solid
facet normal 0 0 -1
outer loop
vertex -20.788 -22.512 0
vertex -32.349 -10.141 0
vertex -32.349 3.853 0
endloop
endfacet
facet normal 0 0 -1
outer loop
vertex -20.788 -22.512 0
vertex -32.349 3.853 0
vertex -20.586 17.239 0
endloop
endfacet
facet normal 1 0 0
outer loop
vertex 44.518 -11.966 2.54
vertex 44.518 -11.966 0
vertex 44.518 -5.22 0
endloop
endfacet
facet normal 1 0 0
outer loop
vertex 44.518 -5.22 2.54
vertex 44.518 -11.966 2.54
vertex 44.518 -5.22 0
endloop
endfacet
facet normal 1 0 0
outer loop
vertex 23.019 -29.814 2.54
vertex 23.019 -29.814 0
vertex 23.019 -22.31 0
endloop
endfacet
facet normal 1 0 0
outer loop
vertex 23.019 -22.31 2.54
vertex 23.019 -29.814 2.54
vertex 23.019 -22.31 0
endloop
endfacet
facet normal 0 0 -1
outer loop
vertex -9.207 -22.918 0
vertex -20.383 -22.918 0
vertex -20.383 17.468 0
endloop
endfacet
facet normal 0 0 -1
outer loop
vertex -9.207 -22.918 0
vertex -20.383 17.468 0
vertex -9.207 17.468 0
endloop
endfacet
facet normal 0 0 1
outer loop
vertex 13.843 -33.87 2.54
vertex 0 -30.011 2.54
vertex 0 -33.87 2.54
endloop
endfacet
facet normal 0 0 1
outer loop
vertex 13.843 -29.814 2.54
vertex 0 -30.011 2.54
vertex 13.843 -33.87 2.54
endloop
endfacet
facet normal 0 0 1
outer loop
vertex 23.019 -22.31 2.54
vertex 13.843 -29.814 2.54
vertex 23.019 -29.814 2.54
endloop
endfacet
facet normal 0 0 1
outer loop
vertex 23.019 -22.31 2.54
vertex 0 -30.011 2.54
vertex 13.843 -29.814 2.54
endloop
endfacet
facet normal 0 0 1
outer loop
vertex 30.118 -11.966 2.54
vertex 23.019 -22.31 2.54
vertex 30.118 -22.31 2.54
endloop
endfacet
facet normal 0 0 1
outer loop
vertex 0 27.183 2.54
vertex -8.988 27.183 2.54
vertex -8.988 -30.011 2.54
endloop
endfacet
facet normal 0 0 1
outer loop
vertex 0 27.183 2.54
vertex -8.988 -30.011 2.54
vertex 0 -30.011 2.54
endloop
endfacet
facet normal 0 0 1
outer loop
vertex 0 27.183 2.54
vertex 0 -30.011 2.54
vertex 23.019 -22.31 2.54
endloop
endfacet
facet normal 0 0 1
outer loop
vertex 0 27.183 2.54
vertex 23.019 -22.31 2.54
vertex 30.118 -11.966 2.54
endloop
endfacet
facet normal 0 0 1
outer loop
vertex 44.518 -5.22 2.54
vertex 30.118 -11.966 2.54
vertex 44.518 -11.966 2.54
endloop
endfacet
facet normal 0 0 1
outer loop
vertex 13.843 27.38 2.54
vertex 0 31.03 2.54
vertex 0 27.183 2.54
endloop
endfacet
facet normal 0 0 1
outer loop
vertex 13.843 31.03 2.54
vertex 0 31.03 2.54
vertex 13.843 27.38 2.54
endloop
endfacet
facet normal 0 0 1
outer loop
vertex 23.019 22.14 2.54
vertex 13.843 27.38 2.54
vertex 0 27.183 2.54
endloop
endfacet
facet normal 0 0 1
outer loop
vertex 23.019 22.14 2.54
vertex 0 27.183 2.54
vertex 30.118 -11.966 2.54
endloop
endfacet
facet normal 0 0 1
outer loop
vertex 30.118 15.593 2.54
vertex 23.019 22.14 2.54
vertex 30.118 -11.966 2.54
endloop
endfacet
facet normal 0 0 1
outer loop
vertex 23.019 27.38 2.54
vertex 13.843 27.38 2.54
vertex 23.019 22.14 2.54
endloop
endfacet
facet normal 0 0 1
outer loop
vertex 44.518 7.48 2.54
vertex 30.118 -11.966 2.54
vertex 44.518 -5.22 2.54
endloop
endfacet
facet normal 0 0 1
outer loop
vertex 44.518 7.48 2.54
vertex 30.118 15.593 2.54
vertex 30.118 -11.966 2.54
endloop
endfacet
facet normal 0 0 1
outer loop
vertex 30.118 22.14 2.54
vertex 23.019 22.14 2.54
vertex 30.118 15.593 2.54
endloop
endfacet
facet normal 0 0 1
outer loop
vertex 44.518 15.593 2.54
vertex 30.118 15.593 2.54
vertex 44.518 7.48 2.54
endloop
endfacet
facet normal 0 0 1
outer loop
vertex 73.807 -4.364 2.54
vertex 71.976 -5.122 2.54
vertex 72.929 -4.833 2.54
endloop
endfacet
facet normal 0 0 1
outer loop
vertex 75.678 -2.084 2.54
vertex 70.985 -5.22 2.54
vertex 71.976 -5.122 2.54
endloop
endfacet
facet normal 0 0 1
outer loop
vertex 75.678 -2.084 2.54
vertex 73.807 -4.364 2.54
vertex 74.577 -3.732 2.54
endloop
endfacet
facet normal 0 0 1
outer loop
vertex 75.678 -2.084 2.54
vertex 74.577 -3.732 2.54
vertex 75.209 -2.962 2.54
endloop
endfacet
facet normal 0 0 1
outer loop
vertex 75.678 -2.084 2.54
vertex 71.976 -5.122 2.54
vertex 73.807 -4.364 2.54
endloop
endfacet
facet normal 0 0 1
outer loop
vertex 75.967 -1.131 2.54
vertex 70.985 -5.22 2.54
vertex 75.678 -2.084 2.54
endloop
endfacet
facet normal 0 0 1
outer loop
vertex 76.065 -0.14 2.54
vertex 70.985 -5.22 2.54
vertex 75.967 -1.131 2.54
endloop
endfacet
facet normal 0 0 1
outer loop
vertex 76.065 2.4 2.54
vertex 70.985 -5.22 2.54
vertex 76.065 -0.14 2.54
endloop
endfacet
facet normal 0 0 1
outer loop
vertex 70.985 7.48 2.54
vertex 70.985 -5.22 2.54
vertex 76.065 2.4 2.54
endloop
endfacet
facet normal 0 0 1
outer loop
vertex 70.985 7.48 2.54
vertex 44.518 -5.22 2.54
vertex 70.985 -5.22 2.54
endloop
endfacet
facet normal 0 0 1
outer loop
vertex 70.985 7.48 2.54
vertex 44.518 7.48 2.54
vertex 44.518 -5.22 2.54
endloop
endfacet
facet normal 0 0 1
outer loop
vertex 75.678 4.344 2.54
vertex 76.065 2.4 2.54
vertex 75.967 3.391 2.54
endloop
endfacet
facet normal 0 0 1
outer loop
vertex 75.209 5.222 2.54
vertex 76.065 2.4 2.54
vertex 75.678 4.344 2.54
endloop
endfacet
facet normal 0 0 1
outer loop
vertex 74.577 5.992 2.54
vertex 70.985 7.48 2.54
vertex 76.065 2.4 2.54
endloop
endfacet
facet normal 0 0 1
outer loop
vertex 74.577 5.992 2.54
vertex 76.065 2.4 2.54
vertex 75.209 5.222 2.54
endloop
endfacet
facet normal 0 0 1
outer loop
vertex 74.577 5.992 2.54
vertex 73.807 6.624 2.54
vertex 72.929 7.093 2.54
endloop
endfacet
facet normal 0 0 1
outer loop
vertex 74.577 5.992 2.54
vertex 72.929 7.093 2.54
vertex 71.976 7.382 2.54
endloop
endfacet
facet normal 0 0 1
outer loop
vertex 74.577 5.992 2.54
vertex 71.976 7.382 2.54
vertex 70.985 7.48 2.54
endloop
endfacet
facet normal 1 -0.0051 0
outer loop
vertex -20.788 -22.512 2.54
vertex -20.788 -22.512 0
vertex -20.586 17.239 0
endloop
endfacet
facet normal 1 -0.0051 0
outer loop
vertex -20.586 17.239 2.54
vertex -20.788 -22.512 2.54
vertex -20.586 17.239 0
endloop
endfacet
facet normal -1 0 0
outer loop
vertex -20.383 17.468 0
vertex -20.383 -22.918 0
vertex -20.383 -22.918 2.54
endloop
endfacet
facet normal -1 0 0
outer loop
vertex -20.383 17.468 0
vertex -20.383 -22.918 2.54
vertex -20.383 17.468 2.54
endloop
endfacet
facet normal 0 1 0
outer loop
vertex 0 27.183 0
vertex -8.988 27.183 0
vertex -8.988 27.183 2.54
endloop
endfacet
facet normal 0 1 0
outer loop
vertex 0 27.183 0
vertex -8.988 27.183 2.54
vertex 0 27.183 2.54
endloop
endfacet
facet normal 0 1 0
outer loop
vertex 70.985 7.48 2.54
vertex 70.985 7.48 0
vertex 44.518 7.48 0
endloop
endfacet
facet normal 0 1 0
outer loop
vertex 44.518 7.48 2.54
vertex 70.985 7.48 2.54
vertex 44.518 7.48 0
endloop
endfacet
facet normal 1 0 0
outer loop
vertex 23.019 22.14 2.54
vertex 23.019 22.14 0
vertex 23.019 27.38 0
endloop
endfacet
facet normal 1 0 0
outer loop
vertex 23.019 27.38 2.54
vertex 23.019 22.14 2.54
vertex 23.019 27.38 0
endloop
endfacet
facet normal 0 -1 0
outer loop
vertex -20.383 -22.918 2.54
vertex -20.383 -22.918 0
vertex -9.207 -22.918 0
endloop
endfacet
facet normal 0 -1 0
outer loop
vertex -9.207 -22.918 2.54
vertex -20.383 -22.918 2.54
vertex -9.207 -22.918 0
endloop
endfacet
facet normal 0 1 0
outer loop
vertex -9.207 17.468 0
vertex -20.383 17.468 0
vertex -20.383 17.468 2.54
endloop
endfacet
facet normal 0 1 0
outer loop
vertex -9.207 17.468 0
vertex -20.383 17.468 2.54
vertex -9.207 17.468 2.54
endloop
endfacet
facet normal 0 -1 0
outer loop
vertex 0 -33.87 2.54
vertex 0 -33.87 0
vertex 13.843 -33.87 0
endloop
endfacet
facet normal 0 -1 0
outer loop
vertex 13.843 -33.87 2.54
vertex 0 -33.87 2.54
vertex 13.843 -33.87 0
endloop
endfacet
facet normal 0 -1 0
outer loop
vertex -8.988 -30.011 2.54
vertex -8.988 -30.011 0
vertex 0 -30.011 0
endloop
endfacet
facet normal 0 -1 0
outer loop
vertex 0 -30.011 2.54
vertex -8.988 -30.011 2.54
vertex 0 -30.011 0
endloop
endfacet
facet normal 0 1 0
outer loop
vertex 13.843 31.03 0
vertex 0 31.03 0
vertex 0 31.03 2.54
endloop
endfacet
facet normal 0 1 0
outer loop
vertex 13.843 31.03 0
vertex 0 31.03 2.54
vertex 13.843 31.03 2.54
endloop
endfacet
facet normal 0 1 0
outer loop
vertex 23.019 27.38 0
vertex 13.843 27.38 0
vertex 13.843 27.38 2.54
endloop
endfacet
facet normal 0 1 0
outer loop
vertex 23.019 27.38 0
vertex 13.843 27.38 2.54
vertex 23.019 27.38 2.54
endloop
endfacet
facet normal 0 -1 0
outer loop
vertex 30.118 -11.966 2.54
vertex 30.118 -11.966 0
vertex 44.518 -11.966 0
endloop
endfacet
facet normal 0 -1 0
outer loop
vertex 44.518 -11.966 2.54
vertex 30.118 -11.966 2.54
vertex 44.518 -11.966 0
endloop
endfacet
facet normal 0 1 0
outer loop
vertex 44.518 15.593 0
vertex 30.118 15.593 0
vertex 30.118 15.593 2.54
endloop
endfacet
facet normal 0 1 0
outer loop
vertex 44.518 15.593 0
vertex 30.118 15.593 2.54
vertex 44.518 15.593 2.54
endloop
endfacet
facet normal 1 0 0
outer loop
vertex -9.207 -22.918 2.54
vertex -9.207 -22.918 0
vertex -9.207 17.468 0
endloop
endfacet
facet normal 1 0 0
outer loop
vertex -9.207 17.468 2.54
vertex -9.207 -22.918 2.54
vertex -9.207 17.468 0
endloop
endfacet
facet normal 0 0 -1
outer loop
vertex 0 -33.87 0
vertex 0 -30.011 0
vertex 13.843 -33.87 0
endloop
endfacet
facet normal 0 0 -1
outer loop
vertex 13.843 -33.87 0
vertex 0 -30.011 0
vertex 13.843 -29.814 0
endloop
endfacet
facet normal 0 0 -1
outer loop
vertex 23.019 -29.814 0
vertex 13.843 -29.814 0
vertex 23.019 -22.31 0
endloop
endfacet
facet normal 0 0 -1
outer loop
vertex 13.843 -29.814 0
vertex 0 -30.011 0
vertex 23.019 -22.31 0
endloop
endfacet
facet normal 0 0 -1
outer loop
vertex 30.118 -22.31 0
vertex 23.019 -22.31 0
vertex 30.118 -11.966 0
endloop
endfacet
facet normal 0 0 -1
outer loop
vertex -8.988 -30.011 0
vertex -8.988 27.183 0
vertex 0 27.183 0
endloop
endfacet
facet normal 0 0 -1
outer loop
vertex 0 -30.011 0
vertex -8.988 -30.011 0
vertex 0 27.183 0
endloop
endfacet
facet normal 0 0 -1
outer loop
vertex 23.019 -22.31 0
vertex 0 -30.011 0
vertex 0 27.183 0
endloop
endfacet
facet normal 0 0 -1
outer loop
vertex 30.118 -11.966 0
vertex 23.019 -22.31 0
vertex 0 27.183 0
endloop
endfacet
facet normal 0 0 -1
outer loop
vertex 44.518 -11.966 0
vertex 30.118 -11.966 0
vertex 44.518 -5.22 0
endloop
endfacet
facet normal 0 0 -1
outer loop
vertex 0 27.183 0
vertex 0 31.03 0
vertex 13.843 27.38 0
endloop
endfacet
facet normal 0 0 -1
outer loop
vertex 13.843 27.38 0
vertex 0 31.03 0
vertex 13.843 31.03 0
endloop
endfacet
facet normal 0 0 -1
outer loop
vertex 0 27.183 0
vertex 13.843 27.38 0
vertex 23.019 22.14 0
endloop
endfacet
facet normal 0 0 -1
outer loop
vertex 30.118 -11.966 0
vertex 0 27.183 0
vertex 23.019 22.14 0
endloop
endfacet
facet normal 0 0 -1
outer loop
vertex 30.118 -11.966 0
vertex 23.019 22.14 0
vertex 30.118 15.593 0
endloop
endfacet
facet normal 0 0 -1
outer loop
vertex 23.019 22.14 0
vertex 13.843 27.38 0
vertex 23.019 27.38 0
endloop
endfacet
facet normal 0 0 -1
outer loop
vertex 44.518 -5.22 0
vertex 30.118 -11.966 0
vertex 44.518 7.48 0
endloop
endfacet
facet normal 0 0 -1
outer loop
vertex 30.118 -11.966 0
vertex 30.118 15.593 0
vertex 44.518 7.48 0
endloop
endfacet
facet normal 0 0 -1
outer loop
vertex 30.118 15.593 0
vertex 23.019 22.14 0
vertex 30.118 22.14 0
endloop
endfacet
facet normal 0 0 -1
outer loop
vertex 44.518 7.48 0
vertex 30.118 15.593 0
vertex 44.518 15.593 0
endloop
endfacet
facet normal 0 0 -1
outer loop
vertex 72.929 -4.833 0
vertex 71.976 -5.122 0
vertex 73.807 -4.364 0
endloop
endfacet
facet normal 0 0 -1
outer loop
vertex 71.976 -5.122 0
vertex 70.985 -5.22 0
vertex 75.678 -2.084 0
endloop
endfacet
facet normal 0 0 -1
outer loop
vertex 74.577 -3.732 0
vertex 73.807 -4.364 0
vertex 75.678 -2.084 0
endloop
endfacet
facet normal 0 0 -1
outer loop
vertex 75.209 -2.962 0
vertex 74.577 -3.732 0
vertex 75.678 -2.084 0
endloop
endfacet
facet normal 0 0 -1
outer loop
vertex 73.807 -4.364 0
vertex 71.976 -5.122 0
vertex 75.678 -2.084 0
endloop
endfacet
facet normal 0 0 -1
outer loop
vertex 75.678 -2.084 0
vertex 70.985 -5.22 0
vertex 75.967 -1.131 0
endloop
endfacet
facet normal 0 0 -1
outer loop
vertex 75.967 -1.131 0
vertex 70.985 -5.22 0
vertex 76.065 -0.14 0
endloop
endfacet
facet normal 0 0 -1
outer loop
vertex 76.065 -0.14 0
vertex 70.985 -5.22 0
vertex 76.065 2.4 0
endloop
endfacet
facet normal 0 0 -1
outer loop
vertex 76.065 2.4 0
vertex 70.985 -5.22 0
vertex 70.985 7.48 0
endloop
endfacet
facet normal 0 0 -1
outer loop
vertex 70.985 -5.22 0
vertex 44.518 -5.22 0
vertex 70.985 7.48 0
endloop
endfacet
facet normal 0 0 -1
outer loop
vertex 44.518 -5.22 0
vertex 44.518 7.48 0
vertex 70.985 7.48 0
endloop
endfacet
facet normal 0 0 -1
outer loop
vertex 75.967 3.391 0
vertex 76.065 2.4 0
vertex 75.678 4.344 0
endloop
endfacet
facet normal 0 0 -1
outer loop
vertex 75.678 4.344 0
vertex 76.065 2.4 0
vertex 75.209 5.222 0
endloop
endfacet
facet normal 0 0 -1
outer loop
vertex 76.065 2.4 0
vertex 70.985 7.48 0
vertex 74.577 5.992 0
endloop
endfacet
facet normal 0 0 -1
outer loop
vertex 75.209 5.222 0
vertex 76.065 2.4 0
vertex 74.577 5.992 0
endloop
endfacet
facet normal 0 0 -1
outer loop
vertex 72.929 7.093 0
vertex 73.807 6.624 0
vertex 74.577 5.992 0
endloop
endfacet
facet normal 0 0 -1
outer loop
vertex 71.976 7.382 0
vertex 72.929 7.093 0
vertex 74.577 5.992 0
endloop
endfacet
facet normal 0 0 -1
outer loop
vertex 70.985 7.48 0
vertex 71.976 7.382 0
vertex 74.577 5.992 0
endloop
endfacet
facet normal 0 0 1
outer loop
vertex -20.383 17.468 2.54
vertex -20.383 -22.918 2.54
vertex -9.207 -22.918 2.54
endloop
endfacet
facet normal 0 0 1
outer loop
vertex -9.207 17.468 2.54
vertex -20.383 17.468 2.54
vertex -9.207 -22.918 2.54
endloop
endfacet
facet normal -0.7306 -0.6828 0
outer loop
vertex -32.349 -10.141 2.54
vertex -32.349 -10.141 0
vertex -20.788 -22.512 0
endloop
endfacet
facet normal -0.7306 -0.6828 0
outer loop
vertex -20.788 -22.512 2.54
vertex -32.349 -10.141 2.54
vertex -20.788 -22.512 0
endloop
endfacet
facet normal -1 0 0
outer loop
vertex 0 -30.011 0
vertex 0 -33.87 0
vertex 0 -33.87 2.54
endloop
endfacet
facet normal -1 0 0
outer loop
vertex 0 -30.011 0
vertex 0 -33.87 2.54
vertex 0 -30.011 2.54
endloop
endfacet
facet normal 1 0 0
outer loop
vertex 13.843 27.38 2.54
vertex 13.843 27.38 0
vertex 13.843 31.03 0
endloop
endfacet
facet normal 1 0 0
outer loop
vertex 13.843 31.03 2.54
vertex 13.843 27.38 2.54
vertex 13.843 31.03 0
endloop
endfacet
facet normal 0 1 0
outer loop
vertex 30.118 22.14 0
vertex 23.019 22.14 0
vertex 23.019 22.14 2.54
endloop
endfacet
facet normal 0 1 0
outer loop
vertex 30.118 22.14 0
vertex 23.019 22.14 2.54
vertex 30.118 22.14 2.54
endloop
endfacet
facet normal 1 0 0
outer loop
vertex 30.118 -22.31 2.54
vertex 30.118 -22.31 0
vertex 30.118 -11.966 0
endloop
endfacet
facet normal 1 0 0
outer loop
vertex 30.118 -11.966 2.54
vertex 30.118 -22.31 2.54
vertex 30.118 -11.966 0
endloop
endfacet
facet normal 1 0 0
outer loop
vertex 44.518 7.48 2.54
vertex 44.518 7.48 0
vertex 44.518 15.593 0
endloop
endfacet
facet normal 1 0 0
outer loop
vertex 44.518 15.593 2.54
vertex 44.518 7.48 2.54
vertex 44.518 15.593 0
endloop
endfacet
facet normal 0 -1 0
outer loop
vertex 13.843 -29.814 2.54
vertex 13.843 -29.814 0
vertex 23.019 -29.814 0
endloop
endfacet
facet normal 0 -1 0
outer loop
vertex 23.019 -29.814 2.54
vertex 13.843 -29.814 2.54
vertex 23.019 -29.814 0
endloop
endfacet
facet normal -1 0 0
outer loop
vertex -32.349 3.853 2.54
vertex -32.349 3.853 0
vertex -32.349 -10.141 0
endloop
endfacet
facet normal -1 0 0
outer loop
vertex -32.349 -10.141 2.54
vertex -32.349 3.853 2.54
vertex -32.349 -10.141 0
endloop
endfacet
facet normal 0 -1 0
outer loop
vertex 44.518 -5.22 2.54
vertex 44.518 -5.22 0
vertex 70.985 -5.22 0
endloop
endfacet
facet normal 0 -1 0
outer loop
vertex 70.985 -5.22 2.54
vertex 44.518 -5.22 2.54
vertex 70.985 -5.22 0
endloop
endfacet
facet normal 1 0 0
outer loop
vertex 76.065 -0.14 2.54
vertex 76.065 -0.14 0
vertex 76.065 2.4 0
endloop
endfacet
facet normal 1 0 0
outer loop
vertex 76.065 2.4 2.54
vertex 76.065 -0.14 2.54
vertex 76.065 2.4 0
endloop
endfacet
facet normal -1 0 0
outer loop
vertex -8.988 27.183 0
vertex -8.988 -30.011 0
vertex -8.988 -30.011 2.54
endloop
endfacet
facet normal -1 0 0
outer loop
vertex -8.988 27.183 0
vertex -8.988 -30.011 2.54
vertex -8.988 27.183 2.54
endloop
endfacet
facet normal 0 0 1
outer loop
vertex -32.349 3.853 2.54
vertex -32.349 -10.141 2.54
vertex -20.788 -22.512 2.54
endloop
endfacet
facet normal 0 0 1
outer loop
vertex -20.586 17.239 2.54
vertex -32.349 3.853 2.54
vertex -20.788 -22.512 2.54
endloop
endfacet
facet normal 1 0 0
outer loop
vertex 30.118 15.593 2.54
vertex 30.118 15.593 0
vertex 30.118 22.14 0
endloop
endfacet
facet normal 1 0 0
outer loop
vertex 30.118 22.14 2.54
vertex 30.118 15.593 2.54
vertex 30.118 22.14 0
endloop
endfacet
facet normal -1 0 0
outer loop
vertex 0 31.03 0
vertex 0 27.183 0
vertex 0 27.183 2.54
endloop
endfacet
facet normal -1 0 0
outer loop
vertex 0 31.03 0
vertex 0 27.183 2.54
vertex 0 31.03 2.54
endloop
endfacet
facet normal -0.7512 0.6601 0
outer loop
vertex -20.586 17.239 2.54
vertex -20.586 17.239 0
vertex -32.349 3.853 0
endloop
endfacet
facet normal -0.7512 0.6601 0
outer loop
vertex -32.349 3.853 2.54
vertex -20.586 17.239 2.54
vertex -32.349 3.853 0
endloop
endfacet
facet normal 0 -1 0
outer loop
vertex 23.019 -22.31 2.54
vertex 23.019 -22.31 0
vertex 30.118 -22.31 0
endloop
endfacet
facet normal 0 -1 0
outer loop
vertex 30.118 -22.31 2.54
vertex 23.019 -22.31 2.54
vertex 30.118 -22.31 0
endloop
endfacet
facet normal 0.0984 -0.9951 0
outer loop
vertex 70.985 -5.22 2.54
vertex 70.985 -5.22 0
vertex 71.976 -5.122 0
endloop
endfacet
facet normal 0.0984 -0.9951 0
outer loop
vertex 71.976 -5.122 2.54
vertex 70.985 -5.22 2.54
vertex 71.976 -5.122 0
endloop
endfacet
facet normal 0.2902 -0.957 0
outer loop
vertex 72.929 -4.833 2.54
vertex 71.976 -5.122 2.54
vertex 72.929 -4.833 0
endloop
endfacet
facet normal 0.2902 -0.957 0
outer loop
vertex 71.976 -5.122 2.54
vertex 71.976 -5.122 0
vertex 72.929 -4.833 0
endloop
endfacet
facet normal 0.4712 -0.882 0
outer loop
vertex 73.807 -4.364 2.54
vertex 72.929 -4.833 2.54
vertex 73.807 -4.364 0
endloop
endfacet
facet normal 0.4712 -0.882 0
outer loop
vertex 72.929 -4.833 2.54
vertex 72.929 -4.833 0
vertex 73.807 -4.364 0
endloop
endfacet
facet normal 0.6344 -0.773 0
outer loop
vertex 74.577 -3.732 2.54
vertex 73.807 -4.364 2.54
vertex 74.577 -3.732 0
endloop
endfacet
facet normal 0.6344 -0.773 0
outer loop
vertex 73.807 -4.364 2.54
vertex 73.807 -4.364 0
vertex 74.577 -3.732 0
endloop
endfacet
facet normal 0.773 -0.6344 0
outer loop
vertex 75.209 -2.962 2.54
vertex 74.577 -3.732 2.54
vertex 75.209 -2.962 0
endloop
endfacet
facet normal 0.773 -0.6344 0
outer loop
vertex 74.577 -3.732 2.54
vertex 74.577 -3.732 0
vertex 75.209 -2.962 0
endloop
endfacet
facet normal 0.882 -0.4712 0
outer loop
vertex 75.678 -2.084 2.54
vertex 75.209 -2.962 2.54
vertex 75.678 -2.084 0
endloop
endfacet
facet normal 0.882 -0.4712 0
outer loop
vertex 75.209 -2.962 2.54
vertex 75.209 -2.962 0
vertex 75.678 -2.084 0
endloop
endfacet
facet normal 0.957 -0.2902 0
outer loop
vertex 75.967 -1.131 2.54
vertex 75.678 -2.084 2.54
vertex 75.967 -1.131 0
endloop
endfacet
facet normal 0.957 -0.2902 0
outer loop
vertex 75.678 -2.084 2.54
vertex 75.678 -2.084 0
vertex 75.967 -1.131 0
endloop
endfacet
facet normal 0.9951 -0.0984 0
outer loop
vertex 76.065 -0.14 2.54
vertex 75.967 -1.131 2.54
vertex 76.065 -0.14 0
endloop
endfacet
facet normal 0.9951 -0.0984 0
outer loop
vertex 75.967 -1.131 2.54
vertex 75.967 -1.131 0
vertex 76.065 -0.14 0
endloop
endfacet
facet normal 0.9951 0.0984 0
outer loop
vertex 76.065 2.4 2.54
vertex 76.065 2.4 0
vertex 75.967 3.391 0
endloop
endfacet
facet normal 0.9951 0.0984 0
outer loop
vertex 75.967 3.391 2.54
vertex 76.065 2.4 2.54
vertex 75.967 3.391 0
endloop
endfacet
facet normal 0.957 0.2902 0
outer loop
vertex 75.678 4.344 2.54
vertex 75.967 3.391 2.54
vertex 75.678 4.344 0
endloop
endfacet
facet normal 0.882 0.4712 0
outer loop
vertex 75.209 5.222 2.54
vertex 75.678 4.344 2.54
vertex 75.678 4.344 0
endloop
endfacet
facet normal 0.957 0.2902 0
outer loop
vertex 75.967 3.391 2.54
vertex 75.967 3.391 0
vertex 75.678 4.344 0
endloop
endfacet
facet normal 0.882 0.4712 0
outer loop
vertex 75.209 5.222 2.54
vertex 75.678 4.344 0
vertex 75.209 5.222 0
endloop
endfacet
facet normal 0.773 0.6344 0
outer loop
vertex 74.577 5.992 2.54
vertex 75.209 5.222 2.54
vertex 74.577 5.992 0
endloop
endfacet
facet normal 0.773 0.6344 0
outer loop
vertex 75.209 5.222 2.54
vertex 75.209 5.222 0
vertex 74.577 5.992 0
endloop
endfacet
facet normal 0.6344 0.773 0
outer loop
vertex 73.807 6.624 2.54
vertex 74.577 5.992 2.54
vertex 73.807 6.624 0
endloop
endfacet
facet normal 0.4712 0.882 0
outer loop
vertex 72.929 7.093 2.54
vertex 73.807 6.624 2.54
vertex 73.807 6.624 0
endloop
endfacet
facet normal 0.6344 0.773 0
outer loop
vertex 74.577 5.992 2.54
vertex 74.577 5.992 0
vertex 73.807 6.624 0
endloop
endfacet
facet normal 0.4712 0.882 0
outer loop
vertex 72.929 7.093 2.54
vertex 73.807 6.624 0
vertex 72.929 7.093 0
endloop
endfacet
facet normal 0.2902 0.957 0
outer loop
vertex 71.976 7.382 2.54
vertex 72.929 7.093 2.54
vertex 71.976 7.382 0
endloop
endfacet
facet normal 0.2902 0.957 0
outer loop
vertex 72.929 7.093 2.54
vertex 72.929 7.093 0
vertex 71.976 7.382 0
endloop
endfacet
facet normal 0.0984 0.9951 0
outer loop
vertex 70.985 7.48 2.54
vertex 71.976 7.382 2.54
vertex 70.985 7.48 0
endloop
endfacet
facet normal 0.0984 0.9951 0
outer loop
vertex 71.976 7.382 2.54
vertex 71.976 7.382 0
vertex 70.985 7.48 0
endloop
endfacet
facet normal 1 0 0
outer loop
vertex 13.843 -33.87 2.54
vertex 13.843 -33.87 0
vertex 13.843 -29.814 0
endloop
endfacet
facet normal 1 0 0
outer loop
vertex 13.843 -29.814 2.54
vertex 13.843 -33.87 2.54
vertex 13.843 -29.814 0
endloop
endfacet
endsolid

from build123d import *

# Parameters (mm, degrees)
F1_DEPTH  = 2.54
F2_W      = 14.602579
F2_H      = 27.559
F3_DEPTH  = 2.54
F4_W      = 7.504107
F4_H      = 44.45
F5_DEPTH  = 2.54
F6_W      = 9.532242
F6_H      = 57.19346
F7_DEPTH  = 2.54
F8_W      = 13.843
F8_H      = 64.90038
F9_DEPTH  = 2.54
F10_W     = 9.532242
F10_H     = 57.19346
F11_DEPTH = 2.54
F12_W     = 11.176
F12_H     = 40.386
F13_DEPTH = 2.54
F15_DEPTH = 2.54


with BuildPart() as f1:
    # F0 (on Top) → F1 (new body)
    with BuildSketch(Plane.XY):
        with BuildLine():
            Line((70.984791, 7.479962), (44.314791, 7.479962))
            Line((44.314791, 7.479962), (44.314791, -5.220038))
            Line((44.314791, -5.220038), (70.984791, -5.220038))
            ThreePointArc((70.984791, -5.220038), (74.576893, -3.732141), (76.064791, -0.140038))
            Line((76.064791, -0.140038), (76.064791, 2.399962))
            ThreePointArc((76.064791, 2.399962), (74.576893, 5.992064), (70.984791, 7.479962))
        make_face()
    extrude(amount=F1_DEPTH)

    # F2 (on Top) → F3 (join)
    with BuildSketch(Plane.XY):
        with Locations((37.216313, 1.813492)):
            Rectangle(F2_W, F2_H)
    extrude(amount=F3_DEPTH)

    # F4 (on Top) → F5 (join)
    with BuildSketch(Plane.XY):
        with Locations((26.36578, -0.084504)):
            Rectangle(F4_W, F4_H)
    extrude(amount=F5_DEPTH)

    # F6 (on Top) → F7 (join)
    with BuildSketch(Plane.XY):
        with Locations((18.253232, -1.216882)):
            Rectangle(F6_W, F6_H)
    extrude(amount=F7_DEPTH)

    # F8 (on Top) → F9 (join)
    with BuildSketch(Plane.XY):
        with Locations((6.9215, -1.419695)):
            Rectangle(F8_W, F8_H)
    extrude(amount=F9_DEPTH)

    # F10 (on Top) → F11 (join)
    with BuildSketch(Plane.XY):
        with Locations((-4.221423, -1.413903)):
            Rectangle(F10_W, F10_H)
    extrude(amount=F11_DEPTH)


with BuildPart() as f13:
    # F12 (on Top) → F13 (new body)
    with BuildSketch(Plane.XY):
        with Locations((-14.794775, -2.724947)):
            Rectangle(F12_W, F12_H)
    extrude(amount=F13_DEPTH)


with BuildPart() as f15:
    # F14 (on Top) → F15 (new body)
    with BuildSketch(Plane.XY):
        Polygon((-20.788403, -22.51232), (-20.585589, 17.239165), (-32.348786, 3.85346), (-32.348786, -10.140684), align=None)
    extrude(amount=F15_DEPTH)


solid = Compound([f1.part, f13.part, f15.part])
